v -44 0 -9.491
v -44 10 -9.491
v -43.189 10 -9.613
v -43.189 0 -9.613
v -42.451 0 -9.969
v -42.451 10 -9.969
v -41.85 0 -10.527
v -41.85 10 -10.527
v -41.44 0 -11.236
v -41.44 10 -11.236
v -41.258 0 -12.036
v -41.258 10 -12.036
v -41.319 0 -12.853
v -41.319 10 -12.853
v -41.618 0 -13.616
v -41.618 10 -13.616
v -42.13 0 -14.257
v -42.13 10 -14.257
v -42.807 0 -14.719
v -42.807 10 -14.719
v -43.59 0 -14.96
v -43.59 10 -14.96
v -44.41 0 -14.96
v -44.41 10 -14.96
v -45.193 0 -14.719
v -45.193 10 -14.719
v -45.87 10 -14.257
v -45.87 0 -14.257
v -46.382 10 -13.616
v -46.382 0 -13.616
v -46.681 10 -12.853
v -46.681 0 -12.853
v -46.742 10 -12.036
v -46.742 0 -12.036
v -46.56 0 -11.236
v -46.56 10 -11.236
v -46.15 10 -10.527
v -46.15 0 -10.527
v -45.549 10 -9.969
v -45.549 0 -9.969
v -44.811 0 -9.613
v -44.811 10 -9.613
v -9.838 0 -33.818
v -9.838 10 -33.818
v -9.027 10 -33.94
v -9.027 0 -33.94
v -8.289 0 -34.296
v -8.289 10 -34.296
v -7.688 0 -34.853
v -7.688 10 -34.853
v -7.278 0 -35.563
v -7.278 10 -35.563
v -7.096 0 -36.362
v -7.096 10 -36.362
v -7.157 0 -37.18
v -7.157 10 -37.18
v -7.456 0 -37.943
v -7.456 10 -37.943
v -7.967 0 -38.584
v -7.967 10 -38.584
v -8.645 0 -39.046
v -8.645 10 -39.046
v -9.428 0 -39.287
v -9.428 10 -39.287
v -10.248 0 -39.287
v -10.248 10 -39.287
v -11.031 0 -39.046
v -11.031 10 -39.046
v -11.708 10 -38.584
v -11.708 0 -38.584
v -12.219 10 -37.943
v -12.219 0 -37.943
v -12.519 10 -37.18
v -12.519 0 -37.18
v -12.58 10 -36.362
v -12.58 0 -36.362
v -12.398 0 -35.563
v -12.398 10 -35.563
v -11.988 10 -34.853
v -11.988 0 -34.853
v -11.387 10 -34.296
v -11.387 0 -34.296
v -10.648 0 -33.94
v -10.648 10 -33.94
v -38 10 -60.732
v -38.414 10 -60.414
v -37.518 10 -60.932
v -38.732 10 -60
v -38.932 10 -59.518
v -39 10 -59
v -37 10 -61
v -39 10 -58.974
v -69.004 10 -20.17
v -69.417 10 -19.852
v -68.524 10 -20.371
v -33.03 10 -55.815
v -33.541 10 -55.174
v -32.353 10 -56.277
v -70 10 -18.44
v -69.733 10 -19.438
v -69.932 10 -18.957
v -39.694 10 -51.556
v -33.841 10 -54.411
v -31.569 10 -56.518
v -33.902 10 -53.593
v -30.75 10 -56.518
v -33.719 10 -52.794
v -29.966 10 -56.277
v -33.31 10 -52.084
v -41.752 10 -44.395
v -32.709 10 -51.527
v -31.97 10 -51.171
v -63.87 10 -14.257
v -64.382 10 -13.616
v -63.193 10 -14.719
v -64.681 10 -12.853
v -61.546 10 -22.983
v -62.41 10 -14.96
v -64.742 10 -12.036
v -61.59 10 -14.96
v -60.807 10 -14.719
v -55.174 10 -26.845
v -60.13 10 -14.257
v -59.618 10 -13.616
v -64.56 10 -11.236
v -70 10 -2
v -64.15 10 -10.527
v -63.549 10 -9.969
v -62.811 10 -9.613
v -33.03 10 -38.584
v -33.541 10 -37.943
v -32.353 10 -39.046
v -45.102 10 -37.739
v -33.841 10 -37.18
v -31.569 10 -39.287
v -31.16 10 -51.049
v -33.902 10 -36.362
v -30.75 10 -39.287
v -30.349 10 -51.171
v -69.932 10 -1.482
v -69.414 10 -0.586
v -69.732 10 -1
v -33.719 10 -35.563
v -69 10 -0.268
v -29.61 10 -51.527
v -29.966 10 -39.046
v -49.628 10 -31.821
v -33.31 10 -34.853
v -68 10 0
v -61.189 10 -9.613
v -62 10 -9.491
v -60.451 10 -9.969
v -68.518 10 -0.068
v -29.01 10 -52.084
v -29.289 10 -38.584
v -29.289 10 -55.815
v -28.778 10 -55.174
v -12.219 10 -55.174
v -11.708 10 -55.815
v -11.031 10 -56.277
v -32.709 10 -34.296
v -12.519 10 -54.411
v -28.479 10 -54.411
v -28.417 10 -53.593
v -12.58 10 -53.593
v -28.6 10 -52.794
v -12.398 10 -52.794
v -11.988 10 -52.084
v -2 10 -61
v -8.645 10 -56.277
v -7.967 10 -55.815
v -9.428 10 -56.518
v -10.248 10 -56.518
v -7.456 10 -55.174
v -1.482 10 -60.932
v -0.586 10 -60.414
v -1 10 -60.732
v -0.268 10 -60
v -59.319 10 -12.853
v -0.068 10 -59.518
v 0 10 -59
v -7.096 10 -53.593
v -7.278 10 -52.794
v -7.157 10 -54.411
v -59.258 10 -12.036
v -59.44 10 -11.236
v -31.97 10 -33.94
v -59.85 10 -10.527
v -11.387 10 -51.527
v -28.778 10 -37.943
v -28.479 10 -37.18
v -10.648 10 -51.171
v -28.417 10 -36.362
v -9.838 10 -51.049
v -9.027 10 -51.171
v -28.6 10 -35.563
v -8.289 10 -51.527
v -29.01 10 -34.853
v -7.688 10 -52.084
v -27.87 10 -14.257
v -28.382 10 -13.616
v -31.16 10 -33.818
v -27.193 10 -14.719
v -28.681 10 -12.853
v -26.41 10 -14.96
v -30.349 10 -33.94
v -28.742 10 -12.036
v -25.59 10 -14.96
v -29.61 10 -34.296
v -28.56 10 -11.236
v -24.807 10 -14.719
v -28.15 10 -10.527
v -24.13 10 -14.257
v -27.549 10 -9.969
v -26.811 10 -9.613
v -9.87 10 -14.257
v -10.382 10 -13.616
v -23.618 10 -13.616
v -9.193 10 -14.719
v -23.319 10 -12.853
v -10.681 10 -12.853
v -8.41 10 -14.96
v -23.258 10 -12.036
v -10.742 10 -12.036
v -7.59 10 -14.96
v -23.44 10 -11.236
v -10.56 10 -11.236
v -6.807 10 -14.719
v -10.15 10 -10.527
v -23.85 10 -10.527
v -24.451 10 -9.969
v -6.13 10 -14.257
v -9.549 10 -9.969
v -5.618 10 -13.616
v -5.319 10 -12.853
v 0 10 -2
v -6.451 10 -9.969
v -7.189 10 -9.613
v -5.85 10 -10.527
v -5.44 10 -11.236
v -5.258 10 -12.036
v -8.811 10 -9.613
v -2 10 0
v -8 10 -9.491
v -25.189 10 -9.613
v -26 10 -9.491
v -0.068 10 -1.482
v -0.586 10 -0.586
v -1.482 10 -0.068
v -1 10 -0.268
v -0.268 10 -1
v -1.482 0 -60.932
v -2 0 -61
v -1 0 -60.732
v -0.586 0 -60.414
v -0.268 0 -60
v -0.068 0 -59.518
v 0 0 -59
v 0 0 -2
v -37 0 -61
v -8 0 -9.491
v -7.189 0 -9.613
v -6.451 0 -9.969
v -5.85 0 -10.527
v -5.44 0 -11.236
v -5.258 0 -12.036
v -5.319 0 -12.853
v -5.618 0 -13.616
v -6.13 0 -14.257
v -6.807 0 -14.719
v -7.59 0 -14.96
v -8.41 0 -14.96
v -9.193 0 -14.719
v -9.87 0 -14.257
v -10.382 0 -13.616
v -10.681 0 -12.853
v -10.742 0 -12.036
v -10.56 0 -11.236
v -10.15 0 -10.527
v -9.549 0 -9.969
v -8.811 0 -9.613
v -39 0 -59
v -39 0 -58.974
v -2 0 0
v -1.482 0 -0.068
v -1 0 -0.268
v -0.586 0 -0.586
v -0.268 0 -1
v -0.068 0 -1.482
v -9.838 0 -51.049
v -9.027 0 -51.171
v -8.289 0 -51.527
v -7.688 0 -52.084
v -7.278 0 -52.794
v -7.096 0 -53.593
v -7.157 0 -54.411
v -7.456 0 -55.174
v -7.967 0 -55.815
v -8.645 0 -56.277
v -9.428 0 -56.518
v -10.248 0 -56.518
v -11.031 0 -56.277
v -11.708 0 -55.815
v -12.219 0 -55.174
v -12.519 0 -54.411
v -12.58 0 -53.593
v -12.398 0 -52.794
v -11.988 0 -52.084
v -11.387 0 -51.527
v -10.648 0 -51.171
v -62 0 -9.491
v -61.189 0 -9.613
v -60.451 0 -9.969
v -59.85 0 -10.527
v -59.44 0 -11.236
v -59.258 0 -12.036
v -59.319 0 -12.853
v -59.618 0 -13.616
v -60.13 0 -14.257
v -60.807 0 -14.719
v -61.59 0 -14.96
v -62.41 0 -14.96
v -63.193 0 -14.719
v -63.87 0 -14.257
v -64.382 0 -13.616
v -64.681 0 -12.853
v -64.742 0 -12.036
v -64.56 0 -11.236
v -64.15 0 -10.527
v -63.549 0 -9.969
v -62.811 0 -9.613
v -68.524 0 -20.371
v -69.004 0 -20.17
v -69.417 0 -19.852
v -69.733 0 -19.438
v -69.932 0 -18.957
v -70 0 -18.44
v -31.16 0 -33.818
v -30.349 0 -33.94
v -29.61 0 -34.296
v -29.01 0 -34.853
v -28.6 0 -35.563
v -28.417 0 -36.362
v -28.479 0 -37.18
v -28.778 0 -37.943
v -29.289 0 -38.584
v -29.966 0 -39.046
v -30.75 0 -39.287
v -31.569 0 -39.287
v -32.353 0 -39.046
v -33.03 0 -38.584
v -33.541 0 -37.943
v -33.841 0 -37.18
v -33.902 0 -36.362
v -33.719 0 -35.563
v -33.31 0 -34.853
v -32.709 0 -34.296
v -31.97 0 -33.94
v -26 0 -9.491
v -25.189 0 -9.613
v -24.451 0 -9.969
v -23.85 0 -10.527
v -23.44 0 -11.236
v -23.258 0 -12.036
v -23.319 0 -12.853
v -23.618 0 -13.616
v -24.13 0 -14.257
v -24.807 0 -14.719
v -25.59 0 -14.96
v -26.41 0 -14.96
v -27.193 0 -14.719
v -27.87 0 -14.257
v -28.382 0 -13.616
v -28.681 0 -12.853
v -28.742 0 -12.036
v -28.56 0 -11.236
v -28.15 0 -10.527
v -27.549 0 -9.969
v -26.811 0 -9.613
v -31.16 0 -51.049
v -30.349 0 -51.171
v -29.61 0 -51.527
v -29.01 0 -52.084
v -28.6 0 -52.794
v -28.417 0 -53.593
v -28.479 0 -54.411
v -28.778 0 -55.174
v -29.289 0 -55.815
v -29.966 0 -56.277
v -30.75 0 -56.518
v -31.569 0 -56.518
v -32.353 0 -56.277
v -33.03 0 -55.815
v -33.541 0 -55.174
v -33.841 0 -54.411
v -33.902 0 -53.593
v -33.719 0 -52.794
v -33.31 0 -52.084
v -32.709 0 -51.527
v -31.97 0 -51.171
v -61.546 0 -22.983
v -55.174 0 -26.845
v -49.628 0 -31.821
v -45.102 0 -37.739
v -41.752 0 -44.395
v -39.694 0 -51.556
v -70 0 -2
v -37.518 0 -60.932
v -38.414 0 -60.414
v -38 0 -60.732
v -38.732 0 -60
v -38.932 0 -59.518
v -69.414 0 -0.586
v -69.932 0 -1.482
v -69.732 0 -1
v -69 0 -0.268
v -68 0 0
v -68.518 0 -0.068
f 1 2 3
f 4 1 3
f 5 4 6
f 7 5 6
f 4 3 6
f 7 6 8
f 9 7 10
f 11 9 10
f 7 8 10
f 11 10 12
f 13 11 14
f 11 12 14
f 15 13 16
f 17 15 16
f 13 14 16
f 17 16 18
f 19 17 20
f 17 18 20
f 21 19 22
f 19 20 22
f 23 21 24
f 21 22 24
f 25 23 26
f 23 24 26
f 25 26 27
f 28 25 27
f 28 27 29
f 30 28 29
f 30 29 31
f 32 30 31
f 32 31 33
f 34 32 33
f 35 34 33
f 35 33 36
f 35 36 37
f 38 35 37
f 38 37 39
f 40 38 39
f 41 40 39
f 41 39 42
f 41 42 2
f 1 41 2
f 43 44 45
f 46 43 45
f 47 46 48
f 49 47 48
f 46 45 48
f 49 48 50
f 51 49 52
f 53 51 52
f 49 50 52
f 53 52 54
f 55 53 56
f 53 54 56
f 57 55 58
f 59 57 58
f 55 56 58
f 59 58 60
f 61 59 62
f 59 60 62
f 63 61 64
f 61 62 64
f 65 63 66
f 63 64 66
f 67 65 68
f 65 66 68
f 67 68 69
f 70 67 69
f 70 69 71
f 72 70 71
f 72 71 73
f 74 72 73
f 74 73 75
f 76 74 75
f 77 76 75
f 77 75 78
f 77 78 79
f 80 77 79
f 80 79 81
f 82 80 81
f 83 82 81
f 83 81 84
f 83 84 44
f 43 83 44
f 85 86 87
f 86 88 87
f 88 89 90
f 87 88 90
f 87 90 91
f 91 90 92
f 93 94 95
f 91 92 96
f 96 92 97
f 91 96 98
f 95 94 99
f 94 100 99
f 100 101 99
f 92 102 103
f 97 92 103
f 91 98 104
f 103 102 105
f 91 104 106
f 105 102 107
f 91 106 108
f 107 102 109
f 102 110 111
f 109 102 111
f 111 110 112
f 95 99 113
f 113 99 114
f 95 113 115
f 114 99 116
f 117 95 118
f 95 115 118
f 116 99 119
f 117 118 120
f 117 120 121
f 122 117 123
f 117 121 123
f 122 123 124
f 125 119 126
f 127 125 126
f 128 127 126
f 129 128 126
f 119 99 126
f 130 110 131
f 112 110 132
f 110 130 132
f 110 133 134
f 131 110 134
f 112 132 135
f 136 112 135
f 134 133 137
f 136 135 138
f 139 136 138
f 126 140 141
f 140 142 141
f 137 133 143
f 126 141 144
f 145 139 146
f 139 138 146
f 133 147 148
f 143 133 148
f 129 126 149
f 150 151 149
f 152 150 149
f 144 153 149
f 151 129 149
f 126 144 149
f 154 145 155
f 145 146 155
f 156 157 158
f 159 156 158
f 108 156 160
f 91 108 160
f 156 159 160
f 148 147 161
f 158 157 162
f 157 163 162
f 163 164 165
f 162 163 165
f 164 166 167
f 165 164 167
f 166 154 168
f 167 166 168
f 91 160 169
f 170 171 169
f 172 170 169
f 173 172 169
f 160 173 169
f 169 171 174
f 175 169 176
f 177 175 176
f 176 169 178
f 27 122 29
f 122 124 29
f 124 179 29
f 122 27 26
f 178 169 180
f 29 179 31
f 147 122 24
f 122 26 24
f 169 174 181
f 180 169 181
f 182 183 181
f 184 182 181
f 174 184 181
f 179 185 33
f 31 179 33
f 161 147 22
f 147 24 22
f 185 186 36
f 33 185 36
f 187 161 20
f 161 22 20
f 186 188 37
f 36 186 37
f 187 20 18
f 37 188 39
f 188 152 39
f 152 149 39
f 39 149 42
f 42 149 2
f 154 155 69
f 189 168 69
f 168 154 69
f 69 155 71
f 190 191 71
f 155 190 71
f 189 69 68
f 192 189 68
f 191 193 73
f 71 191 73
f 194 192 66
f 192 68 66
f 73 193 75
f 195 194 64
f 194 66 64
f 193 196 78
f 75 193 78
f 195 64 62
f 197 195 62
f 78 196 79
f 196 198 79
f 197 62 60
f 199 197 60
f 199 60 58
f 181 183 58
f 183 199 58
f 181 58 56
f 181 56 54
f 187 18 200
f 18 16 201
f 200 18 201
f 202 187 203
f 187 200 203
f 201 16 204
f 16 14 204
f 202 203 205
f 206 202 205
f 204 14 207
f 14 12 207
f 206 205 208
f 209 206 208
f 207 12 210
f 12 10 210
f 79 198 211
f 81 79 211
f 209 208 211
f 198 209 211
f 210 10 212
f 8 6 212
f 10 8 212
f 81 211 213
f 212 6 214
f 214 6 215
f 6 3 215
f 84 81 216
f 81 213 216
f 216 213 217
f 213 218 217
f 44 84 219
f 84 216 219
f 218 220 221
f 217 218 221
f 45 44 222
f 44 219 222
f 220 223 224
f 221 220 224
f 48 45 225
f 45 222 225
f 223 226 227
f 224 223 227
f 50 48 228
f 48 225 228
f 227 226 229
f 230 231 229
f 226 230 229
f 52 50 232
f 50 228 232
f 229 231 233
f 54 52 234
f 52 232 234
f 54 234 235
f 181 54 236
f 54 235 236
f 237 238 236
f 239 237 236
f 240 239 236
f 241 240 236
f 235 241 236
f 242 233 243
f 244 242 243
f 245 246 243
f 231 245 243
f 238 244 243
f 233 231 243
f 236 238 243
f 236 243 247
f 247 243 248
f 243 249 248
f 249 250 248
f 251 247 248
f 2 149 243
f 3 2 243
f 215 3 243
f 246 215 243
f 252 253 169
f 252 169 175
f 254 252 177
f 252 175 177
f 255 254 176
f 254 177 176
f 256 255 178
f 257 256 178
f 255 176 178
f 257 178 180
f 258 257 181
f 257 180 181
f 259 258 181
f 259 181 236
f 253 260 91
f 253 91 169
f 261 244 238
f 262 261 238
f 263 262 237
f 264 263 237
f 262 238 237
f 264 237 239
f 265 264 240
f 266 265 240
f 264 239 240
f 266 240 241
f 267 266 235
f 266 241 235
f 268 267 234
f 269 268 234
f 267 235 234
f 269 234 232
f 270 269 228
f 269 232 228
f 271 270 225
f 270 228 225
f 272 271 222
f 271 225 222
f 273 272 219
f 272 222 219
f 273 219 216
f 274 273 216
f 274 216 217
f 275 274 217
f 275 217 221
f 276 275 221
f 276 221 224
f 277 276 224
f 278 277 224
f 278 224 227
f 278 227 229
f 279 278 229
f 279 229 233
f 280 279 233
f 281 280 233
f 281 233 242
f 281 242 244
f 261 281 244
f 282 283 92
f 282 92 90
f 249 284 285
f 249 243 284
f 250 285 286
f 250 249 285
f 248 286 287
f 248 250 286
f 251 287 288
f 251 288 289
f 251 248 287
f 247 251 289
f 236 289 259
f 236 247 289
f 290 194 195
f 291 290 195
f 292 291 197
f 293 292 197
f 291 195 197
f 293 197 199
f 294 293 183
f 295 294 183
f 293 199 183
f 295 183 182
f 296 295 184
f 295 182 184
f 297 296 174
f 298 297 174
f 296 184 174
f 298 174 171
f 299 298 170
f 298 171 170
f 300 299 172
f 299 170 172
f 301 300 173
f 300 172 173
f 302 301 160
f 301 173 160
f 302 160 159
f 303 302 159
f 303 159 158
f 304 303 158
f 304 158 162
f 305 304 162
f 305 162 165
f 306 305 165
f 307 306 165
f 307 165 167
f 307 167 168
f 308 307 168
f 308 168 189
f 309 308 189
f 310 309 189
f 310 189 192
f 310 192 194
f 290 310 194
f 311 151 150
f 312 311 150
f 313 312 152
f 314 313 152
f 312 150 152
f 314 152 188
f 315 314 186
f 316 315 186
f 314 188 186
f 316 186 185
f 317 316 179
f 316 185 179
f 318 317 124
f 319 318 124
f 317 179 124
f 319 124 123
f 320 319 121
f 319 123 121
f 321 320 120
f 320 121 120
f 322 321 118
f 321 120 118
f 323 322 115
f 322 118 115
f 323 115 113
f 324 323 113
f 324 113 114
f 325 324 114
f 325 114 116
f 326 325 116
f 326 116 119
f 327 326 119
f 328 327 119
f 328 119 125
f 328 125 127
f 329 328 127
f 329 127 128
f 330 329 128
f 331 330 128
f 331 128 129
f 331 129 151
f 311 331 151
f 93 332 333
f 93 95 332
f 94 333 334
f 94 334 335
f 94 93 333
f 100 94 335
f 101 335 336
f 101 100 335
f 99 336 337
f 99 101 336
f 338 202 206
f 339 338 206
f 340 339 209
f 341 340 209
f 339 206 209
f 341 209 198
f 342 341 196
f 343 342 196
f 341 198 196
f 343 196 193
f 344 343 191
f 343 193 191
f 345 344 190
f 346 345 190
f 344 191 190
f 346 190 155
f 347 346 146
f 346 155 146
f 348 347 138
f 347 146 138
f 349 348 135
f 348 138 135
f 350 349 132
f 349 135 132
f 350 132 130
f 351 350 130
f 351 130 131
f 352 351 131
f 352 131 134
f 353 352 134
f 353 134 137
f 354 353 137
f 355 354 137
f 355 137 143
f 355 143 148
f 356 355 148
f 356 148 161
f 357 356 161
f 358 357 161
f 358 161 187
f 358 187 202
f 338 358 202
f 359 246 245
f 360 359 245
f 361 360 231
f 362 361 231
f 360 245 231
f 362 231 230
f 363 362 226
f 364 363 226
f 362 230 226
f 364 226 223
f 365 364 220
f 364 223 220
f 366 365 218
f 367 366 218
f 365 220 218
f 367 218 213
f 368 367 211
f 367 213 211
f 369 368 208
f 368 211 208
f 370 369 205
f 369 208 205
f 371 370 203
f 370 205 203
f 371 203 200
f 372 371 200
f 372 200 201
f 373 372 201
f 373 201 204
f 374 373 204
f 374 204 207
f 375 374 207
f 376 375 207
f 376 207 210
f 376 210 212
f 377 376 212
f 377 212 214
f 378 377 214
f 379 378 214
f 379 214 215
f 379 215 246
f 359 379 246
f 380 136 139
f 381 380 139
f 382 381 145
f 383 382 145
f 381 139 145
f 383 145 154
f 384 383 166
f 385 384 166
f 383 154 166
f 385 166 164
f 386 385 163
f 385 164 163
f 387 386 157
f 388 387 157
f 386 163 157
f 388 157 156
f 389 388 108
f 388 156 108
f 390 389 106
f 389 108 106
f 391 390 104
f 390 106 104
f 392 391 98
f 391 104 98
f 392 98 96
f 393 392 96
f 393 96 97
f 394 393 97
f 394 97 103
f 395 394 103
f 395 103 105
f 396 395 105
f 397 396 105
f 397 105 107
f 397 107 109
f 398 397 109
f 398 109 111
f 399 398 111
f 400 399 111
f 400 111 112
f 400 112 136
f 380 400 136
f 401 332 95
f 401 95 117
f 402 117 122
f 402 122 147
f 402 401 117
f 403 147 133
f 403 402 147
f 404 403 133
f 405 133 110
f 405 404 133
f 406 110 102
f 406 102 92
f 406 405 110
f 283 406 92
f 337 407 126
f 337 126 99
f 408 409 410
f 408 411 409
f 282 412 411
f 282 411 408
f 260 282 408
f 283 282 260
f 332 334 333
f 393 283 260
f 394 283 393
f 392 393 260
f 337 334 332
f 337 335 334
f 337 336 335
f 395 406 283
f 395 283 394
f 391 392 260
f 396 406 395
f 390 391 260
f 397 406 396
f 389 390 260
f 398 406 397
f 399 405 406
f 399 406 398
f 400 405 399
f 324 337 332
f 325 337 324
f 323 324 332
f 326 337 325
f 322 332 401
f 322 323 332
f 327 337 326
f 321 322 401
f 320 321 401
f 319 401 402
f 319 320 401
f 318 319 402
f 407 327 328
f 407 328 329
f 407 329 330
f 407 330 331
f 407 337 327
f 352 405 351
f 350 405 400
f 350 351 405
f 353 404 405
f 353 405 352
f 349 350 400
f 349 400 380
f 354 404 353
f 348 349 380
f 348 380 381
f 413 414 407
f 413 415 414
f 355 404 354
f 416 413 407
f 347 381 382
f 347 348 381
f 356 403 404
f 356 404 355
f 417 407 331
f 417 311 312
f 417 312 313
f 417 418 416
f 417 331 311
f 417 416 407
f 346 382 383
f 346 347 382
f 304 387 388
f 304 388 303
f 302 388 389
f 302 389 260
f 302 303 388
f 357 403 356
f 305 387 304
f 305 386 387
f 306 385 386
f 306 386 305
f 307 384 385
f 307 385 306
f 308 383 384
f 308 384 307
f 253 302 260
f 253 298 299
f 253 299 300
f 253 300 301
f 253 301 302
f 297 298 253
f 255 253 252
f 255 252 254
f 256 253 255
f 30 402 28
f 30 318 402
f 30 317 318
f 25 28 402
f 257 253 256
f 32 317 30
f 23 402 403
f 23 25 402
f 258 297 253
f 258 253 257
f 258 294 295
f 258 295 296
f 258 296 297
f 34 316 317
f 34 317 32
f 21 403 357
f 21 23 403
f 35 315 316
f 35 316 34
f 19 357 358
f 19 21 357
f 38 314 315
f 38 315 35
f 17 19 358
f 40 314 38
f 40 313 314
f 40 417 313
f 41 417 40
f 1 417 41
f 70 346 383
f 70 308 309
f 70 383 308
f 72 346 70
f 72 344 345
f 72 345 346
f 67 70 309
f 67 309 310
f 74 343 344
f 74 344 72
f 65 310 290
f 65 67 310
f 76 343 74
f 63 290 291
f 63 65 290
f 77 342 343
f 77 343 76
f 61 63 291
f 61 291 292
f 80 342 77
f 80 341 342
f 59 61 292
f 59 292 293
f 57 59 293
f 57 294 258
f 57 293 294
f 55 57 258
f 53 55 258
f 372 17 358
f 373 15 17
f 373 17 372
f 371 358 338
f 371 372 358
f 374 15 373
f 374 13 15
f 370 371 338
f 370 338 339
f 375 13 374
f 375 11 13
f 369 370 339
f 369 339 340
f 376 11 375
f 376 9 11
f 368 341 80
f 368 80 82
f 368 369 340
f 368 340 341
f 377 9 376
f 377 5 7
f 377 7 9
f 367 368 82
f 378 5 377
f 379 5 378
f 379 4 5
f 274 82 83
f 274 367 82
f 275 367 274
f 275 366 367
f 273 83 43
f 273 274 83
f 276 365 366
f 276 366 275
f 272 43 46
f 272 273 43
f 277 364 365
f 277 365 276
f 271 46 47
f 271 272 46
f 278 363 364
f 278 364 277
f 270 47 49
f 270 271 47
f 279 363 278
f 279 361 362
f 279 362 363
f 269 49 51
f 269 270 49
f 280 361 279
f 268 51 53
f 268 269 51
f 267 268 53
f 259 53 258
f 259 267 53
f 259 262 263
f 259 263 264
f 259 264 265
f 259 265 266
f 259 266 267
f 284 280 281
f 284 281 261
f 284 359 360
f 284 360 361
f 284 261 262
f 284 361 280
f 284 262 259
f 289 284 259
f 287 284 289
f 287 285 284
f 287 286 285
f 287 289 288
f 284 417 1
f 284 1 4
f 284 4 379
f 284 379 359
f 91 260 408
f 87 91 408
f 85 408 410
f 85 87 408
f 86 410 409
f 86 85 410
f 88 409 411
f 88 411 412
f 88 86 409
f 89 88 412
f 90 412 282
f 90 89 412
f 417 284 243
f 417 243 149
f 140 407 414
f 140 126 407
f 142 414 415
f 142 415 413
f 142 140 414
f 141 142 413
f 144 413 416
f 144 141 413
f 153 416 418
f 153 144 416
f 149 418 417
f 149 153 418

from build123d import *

# Parameters (mm, degrees)
BOSS_EXTRUDE2_DEPTH = 10
FILLET4_R           = 40
FILLET5_R           = 2
FILLET6_R           = 2
FILLET7_R           = 2
SKETCH2_R           = 2.75
CUT_EXTRUDE1_DEPTH  = 94.386294498


with BuildPart() as part:
    # Sketch1 → Boss-Extrude2 (new body)
    with BuildSketch(Plane(origin=(0, 0, 0), x_dir=(1, 0, 0), z_dir=(0, 1, 0))):
        Polygon((-39, 61), (0, 61), (0, 0), (-70, 0), (-70, 20), (-39, 20), align=None)
    extrude(amount=BOSS_EXTRUDE2_DEPTH)

    # Fillet4
    # the kernel refuses this fillet: 40 mm, written as the material it adds along each edge
    with BuildSketch(Plane(origin=(-39, 0, -20), x_dir=(-1, 0, 0), z_dir=(0, 1, 0))) as fillet4_piece_1:
        with BuildLine():
            CenterArc((40, -38.97435054), FILLET4_R, 103.002878163, 76.997121837)
            Line((0, -38.97435054), (-0.8, -38.97435054))
            Line((-0.8, -38.97435054), (-0.8, 0))
            Line((-0.8, 0), (0, 0.8))
            ThreePointArc((0, 0.8), (15.5, 0.8), (30.82, 0.779487011))
            Line((30.82, 0.779487011), (31, 0))
        make_face()
    extrude(amount=10)

    # Fillet5
    fillet5_edges = [part.edges().sort_by_distance(p)[0] for p in [
        (0, 5, -61),
        (0, 5, 0),
        (-70, 5, 0),
    ]]
    fillet(fillet5_edges, radius=FILLET5_R)

    # Fillet6
    fillet6_edges = [part.edges().sort_by_distance(p)[0] for p in [
        (-39, 5, -61),
    ]]
    fillet(fillet6_edges, radius=FILLET6_R)

    # Fillet7
    fillet7_edges = [part.edges().sort_by_distance(p)[0] for p in [
        (-70, 5, -20),
    ]]
    fillet(fillet7_edges, radius=FILLET7_R)

    # Sketch2 → Cut-Extrude1 (cut, through all)
    with BuildSketch(Plane(origin=(0, 10, 0), x_dir=(1, 0, 0), z_dir=(0, 1, 0))):
        with Locations(Location((-9.837865554, 53.798881229, 0), (0, 0, 270))):
            Circle(SKETCH2_R)
        with Locations(Location((-31.15958497, 53.798881229, 0), (0, 0, 270))):
            Circle(SKETCH2_R)
        with Locations(Location((-31.15958497, 36.567952328, 0), (0, 0, 270))):
            Circle(SKETCH2_R)
        with Locations(Location((-9.837865554, 36.567952328, 0), (0, 0, 270))):
            Circle(SKETCH2_R)
        with Locations(Location((-8, 12.241109826, 0), (0, 0, 270))):
            Circle(SKETCH2_R)
        with Locations(Location((-26, 12.241109826, 0), (0, 0, 270))):
            Circle(SKETCH2_R)
        with Locations(Location((-44, 12.241109826, 0), (0, 0, 270))):
            Circle(SKETCH2_R)
        with Locations(Location((-62, 12.241109826, 0), (0, 0, 270))):
            Circle(SKETCH2_R)
    extrude(amount=-CUT_EXTRUDE1_DEPTH, mode=Mode.SUBTRACT)


solid = part.part
